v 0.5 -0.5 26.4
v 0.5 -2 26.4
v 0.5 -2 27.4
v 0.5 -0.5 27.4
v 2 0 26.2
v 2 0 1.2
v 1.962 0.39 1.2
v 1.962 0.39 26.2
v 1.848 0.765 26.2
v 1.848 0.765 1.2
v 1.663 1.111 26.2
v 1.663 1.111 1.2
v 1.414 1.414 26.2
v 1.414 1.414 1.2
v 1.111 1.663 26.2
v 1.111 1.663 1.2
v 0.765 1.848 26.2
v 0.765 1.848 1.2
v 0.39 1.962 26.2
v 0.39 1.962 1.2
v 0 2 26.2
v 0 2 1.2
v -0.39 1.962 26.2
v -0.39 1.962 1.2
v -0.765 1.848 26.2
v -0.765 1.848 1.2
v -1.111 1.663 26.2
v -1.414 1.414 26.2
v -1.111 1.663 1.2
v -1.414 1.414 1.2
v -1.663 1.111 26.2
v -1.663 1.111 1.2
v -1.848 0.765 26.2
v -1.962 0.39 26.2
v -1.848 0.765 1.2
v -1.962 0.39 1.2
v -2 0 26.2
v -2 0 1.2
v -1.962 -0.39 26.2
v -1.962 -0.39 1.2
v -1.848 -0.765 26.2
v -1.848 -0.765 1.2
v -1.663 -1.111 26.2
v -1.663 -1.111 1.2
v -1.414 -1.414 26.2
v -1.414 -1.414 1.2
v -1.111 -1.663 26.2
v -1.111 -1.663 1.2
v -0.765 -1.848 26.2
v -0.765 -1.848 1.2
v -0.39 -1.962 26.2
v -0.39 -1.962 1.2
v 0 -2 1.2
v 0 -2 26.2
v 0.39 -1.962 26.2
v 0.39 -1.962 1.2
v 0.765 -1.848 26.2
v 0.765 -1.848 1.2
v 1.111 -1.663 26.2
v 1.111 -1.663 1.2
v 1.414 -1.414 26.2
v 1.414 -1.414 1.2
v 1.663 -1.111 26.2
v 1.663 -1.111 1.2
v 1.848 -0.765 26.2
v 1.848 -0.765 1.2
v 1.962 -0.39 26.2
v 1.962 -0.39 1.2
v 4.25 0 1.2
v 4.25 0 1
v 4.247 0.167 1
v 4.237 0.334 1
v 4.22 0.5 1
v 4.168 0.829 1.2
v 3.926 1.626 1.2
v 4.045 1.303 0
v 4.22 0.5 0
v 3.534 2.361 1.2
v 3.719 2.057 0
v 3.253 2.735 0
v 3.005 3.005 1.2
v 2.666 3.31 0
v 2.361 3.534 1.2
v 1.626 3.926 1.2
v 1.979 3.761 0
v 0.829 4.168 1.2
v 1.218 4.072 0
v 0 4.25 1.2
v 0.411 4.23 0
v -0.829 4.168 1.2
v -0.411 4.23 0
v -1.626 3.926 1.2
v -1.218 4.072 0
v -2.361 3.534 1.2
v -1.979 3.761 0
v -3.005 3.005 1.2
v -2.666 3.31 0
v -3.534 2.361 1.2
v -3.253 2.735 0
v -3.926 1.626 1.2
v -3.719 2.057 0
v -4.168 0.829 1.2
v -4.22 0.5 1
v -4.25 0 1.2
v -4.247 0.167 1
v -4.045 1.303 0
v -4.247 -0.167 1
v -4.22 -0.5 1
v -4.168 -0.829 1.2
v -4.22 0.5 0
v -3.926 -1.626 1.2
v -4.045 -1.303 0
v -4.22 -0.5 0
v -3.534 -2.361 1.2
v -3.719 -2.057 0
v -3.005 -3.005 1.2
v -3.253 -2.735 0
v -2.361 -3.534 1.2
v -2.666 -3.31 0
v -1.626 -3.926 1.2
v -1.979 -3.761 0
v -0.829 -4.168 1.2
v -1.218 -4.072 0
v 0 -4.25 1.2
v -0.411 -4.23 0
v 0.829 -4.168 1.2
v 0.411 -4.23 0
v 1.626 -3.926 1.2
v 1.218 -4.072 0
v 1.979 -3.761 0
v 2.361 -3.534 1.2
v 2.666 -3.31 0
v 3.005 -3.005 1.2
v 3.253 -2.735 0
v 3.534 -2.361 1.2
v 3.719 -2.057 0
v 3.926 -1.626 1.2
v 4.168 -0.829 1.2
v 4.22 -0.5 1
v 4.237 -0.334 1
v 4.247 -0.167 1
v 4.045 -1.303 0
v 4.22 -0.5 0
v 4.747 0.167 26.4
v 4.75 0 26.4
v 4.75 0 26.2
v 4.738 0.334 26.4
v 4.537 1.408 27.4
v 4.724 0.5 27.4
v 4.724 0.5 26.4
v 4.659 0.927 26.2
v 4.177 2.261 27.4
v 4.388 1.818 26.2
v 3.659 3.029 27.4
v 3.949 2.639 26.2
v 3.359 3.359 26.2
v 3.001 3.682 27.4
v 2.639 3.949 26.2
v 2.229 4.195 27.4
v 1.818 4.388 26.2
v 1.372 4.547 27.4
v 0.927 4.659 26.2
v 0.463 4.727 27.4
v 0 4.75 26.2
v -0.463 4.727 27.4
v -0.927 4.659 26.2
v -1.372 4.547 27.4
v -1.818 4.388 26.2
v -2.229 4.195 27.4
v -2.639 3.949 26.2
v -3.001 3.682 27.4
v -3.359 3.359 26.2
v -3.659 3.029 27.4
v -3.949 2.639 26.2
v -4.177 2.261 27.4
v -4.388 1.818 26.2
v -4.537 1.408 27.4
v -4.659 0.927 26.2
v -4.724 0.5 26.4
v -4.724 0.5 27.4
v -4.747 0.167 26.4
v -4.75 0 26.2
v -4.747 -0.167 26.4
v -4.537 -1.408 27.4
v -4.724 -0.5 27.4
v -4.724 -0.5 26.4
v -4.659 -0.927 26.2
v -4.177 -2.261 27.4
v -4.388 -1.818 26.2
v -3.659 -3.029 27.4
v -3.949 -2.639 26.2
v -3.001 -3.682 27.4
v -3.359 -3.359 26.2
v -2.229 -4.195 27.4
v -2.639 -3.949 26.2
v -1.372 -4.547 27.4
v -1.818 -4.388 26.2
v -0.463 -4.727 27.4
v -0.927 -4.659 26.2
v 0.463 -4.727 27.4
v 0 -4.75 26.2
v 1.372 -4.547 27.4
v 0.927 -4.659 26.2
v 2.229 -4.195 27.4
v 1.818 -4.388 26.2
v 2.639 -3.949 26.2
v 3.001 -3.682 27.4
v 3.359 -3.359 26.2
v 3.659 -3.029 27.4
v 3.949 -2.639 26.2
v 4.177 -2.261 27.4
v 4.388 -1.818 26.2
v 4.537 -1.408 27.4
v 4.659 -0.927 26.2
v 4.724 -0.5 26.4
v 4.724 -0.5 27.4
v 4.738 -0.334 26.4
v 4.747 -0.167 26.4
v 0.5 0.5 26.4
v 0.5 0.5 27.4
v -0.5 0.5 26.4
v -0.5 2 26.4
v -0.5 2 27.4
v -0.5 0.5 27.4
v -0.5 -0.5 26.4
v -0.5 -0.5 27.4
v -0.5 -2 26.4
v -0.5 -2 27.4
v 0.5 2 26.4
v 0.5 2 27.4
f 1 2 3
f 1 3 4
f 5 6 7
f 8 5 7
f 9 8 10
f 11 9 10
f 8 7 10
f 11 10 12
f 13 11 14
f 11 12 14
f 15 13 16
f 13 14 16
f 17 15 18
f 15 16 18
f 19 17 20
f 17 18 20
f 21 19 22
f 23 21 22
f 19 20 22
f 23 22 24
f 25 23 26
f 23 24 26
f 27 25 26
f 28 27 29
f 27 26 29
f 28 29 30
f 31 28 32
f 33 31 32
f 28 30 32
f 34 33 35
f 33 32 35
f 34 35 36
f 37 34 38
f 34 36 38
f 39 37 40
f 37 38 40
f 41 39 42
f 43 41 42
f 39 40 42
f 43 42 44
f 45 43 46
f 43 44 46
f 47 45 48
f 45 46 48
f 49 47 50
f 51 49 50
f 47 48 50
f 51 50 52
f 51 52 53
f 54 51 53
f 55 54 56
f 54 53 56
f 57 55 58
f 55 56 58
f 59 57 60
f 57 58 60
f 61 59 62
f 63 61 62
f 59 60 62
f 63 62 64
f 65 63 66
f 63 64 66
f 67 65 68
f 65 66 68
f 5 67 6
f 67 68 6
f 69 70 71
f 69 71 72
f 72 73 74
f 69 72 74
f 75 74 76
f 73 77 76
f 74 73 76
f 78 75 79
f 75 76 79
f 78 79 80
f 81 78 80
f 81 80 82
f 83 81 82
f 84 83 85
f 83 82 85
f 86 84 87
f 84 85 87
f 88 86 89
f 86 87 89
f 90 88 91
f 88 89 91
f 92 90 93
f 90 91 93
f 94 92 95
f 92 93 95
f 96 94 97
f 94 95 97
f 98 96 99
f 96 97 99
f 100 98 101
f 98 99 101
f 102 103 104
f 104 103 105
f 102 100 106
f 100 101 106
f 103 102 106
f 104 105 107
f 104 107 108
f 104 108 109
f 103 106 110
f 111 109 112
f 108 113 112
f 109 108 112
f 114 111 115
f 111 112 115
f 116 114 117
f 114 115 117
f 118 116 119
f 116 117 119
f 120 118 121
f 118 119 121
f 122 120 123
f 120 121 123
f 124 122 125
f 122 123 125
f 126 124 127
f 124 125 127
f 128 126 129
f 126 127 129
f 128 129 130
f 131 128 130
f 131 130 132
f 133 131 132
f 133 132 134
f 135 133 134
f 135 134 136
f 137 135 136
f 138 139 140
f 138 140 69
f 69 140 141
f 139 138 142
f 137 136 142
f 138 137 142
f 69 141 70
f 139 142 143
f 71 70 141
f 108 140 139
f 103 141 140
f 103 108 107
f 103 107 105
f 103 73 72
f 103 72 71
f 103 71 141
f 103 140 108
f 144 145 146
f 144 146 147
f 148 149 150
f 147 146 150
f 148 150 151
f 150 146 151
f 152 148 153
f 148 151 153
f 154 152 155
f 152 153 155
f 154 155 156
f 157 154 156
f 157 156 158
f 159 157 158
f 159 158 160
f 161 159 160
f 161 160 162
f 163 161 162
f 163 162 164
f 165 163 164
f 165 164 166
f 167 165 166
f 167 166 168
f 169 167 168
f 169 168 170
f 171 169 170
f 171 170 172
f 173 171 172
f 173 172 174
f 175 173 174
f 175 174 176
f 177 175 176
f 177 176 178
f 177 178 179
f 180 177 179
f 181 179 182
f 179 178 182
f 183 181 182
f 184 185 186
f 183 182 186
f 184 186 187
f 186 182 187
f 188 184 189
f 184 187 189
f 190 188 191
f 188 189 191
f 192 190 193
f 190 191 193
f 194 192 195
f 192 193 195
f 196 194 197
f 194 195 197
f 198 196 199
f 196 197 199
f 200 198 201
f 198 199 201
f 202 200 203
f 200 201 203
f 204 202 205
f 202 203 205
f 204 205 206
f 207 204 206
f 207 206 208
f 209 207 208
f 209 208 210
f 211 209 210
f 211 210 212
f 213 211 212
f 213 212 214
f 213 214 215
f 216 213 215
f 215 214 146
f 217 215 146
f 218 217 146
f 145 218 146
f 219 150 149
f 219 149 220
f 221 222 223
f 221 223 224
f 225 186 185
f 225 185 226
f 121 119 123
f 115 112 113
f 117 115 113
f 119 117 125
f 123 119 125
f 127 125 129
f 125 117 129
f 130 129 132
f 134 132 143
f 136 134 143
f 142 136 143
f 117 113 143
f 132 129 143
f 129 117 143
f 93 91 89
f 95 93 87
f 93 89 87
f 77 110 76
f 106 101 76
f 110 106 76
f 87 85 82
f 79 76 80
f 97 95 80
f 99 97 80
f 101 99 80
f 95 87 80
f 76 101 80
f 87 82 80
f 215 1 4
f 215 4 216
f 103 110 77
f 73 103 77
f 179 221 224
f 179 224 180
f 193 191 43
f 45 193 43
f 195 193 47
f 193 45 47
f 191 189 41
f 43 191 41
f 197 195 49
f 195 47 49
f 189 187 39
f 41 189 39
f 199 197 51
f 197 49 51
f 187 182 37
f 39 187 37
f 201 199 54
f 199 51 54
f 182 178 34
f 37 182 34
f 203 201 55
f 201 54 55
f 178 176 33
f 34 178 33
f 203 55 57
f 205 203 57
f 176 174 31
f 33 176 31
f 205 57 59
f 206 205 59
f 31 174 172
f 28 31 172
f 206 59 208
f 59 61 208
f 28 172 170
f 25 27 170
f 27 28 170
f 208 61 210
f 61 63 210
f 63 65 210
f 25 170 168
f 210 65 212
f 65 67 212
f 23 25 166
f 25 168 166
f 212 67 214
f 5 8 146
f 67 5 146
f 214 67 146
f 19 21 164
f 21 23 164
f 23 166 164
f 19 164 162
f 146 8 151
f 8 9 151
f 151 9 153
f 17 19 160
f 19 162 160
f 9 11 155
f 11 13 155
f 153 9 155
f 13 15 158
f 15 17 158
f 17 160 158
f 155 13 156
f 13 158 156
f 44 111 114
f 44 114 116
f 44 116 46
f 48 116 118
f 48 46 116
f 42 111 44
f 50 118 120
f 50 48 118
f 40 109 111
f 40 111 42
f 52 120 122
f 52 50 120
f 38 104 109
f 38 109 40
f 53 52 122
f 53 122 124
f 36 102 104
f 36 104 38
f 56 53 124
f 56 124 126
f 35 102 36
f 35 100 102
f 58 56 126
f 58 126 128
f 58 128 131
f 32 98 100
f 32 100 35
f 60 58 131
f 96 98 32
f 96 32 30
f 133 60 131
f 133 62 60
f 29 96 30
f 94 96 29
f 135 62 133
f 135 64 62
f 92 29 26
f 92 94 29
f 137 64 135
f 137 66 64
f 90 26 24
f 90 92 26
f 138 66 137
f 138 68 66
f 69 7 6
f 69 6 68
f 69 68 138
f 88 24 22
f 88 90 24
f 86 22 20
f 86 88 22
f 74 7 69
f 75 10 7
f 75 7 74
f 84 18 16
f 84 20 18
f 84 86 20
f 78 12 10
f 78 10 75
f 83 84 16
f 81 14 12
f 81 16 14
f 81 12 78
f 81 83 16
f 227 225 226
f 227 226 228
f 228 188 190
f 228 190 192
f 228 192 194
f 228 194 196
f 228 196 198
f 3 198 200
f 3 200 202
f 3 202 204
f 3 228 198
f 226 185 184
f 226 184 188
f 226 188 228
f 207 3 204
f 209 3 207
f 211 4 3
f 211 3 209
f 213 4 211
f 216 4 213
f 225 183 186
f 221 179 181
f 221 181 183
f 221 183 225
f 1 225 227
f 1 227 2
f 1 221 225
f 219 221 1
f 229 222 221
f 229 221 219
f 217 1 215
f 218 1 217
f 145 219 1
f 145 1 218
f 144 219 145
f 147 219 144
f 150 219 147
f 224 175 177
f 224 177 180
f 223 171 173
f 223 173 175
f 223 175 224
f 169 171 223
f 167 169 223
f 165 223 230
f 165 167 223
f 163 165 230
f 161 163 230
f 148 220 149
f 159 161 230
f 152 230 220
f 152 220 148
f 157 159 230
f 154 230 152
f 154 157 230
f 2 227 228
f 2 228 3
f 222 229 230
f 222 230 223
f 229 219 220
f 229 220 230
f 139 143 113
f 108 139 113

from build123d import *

# Parameters (mm, degrees)
SKETCH_1_R          = 4.25
EXTRUDE_1_DEPTH     = 1.2
SKETCH_2_R          = 2
EXTRUDE_2_DEPTH     = 25
SKETCH_3_R          = 4.75
EXTRUDE_3_DEPTH     = 1.2
CUT_EXTRUDE_START   = -1
CUT_EXTRUDE_1_DEPTH = 1
CUT_EXTRUDE_2_DEPTH = 1


with BuildPart() as part:
    # 草图1 → 凸台-拉伸1 (new body)
    with BuildSketch(Plane.XY):
        Circle(SKETCH_1_R)
    extrude(amount=EXTRUDE_1_DEPTH)

    # 草图2 → 凸台-拉伸2 (add)
    with BuildSketch(Plane.XY.offset(1.2)):
        Circle(SKETCH_2_R)
    extrude(amount=EXTRUDE_2_DEPTH)

    # 草图3 → 凸台-拉伸3 (add)
    with BuildSketch(Plane.XY.offset(26.2)):
        Circle(SKETCH_3_R)
    extrude(amount=EXTRUDE_3_DEPTH)

    # 草图4 → 切除-拉伸1 (cut)
    with BuildSketch(Plane.XY.offset(27.4).offset(CUT_EXTRUDE_START)):
        with BuildLine():
            Line((-0.5, 2), (-0.5, 0.5))
            Line((-0.5, 0.5), (-4.723610907, 0.5))
            ThreePointArc((-4.723610907, 0.5), (-4.75, 0), (-4.723610907, -0.5))
            Line((-4.723610907, -0.5), (-0.5, -0.5))
            Line((-0.5, -0.5), (-0.5, -2))
            Line((-0.5, -2), (0.5, -2))
            Line((0.5, -2), (0.5, -0.5))
            Line((0.5, -0.5), (4.723610907, -0.5))
            ThreePointArc((4.723610907, -0.5), (4.75, 0), (4.723610907, 0.5))
            Line((4.723610907, 0.5), (0.5, 0.5))
            Line((0.5, 0.5), (0.5, 2))
            Line((0.5, 2), (-0.5, 2))
        make_face()
    extrude(amount=CUT_EXTRUDE_1_DEPTH, mode=Mode.SUBTRACT)

    # 草图5 → 切除-拉伸2 (cut)
    with BuildSketch(Plane(origin=(0, 0, 0), x_dir=(-1, 0, 0), z_dir=(0, 0, -1))):
        with BuildLine():
            Line((-4.723610907, -0.5), (4.723610907, -0.5))
            ThreePointArc((4.723610907, -0.5), (4.75, 0), (4.723610907, 0.5))
            Line((4.723610907, 0.5), (-4.723610907, 0.5))
            ThreePointArc((-4.723610907, 0.5), (-4.75, 0), (-4.723610907, -0.5))
        make_face()
    extrude(amount=-CUT_EXTRUDE_2_DEPTH, mode=Mode.SUBTRACT)


solid = part.part
